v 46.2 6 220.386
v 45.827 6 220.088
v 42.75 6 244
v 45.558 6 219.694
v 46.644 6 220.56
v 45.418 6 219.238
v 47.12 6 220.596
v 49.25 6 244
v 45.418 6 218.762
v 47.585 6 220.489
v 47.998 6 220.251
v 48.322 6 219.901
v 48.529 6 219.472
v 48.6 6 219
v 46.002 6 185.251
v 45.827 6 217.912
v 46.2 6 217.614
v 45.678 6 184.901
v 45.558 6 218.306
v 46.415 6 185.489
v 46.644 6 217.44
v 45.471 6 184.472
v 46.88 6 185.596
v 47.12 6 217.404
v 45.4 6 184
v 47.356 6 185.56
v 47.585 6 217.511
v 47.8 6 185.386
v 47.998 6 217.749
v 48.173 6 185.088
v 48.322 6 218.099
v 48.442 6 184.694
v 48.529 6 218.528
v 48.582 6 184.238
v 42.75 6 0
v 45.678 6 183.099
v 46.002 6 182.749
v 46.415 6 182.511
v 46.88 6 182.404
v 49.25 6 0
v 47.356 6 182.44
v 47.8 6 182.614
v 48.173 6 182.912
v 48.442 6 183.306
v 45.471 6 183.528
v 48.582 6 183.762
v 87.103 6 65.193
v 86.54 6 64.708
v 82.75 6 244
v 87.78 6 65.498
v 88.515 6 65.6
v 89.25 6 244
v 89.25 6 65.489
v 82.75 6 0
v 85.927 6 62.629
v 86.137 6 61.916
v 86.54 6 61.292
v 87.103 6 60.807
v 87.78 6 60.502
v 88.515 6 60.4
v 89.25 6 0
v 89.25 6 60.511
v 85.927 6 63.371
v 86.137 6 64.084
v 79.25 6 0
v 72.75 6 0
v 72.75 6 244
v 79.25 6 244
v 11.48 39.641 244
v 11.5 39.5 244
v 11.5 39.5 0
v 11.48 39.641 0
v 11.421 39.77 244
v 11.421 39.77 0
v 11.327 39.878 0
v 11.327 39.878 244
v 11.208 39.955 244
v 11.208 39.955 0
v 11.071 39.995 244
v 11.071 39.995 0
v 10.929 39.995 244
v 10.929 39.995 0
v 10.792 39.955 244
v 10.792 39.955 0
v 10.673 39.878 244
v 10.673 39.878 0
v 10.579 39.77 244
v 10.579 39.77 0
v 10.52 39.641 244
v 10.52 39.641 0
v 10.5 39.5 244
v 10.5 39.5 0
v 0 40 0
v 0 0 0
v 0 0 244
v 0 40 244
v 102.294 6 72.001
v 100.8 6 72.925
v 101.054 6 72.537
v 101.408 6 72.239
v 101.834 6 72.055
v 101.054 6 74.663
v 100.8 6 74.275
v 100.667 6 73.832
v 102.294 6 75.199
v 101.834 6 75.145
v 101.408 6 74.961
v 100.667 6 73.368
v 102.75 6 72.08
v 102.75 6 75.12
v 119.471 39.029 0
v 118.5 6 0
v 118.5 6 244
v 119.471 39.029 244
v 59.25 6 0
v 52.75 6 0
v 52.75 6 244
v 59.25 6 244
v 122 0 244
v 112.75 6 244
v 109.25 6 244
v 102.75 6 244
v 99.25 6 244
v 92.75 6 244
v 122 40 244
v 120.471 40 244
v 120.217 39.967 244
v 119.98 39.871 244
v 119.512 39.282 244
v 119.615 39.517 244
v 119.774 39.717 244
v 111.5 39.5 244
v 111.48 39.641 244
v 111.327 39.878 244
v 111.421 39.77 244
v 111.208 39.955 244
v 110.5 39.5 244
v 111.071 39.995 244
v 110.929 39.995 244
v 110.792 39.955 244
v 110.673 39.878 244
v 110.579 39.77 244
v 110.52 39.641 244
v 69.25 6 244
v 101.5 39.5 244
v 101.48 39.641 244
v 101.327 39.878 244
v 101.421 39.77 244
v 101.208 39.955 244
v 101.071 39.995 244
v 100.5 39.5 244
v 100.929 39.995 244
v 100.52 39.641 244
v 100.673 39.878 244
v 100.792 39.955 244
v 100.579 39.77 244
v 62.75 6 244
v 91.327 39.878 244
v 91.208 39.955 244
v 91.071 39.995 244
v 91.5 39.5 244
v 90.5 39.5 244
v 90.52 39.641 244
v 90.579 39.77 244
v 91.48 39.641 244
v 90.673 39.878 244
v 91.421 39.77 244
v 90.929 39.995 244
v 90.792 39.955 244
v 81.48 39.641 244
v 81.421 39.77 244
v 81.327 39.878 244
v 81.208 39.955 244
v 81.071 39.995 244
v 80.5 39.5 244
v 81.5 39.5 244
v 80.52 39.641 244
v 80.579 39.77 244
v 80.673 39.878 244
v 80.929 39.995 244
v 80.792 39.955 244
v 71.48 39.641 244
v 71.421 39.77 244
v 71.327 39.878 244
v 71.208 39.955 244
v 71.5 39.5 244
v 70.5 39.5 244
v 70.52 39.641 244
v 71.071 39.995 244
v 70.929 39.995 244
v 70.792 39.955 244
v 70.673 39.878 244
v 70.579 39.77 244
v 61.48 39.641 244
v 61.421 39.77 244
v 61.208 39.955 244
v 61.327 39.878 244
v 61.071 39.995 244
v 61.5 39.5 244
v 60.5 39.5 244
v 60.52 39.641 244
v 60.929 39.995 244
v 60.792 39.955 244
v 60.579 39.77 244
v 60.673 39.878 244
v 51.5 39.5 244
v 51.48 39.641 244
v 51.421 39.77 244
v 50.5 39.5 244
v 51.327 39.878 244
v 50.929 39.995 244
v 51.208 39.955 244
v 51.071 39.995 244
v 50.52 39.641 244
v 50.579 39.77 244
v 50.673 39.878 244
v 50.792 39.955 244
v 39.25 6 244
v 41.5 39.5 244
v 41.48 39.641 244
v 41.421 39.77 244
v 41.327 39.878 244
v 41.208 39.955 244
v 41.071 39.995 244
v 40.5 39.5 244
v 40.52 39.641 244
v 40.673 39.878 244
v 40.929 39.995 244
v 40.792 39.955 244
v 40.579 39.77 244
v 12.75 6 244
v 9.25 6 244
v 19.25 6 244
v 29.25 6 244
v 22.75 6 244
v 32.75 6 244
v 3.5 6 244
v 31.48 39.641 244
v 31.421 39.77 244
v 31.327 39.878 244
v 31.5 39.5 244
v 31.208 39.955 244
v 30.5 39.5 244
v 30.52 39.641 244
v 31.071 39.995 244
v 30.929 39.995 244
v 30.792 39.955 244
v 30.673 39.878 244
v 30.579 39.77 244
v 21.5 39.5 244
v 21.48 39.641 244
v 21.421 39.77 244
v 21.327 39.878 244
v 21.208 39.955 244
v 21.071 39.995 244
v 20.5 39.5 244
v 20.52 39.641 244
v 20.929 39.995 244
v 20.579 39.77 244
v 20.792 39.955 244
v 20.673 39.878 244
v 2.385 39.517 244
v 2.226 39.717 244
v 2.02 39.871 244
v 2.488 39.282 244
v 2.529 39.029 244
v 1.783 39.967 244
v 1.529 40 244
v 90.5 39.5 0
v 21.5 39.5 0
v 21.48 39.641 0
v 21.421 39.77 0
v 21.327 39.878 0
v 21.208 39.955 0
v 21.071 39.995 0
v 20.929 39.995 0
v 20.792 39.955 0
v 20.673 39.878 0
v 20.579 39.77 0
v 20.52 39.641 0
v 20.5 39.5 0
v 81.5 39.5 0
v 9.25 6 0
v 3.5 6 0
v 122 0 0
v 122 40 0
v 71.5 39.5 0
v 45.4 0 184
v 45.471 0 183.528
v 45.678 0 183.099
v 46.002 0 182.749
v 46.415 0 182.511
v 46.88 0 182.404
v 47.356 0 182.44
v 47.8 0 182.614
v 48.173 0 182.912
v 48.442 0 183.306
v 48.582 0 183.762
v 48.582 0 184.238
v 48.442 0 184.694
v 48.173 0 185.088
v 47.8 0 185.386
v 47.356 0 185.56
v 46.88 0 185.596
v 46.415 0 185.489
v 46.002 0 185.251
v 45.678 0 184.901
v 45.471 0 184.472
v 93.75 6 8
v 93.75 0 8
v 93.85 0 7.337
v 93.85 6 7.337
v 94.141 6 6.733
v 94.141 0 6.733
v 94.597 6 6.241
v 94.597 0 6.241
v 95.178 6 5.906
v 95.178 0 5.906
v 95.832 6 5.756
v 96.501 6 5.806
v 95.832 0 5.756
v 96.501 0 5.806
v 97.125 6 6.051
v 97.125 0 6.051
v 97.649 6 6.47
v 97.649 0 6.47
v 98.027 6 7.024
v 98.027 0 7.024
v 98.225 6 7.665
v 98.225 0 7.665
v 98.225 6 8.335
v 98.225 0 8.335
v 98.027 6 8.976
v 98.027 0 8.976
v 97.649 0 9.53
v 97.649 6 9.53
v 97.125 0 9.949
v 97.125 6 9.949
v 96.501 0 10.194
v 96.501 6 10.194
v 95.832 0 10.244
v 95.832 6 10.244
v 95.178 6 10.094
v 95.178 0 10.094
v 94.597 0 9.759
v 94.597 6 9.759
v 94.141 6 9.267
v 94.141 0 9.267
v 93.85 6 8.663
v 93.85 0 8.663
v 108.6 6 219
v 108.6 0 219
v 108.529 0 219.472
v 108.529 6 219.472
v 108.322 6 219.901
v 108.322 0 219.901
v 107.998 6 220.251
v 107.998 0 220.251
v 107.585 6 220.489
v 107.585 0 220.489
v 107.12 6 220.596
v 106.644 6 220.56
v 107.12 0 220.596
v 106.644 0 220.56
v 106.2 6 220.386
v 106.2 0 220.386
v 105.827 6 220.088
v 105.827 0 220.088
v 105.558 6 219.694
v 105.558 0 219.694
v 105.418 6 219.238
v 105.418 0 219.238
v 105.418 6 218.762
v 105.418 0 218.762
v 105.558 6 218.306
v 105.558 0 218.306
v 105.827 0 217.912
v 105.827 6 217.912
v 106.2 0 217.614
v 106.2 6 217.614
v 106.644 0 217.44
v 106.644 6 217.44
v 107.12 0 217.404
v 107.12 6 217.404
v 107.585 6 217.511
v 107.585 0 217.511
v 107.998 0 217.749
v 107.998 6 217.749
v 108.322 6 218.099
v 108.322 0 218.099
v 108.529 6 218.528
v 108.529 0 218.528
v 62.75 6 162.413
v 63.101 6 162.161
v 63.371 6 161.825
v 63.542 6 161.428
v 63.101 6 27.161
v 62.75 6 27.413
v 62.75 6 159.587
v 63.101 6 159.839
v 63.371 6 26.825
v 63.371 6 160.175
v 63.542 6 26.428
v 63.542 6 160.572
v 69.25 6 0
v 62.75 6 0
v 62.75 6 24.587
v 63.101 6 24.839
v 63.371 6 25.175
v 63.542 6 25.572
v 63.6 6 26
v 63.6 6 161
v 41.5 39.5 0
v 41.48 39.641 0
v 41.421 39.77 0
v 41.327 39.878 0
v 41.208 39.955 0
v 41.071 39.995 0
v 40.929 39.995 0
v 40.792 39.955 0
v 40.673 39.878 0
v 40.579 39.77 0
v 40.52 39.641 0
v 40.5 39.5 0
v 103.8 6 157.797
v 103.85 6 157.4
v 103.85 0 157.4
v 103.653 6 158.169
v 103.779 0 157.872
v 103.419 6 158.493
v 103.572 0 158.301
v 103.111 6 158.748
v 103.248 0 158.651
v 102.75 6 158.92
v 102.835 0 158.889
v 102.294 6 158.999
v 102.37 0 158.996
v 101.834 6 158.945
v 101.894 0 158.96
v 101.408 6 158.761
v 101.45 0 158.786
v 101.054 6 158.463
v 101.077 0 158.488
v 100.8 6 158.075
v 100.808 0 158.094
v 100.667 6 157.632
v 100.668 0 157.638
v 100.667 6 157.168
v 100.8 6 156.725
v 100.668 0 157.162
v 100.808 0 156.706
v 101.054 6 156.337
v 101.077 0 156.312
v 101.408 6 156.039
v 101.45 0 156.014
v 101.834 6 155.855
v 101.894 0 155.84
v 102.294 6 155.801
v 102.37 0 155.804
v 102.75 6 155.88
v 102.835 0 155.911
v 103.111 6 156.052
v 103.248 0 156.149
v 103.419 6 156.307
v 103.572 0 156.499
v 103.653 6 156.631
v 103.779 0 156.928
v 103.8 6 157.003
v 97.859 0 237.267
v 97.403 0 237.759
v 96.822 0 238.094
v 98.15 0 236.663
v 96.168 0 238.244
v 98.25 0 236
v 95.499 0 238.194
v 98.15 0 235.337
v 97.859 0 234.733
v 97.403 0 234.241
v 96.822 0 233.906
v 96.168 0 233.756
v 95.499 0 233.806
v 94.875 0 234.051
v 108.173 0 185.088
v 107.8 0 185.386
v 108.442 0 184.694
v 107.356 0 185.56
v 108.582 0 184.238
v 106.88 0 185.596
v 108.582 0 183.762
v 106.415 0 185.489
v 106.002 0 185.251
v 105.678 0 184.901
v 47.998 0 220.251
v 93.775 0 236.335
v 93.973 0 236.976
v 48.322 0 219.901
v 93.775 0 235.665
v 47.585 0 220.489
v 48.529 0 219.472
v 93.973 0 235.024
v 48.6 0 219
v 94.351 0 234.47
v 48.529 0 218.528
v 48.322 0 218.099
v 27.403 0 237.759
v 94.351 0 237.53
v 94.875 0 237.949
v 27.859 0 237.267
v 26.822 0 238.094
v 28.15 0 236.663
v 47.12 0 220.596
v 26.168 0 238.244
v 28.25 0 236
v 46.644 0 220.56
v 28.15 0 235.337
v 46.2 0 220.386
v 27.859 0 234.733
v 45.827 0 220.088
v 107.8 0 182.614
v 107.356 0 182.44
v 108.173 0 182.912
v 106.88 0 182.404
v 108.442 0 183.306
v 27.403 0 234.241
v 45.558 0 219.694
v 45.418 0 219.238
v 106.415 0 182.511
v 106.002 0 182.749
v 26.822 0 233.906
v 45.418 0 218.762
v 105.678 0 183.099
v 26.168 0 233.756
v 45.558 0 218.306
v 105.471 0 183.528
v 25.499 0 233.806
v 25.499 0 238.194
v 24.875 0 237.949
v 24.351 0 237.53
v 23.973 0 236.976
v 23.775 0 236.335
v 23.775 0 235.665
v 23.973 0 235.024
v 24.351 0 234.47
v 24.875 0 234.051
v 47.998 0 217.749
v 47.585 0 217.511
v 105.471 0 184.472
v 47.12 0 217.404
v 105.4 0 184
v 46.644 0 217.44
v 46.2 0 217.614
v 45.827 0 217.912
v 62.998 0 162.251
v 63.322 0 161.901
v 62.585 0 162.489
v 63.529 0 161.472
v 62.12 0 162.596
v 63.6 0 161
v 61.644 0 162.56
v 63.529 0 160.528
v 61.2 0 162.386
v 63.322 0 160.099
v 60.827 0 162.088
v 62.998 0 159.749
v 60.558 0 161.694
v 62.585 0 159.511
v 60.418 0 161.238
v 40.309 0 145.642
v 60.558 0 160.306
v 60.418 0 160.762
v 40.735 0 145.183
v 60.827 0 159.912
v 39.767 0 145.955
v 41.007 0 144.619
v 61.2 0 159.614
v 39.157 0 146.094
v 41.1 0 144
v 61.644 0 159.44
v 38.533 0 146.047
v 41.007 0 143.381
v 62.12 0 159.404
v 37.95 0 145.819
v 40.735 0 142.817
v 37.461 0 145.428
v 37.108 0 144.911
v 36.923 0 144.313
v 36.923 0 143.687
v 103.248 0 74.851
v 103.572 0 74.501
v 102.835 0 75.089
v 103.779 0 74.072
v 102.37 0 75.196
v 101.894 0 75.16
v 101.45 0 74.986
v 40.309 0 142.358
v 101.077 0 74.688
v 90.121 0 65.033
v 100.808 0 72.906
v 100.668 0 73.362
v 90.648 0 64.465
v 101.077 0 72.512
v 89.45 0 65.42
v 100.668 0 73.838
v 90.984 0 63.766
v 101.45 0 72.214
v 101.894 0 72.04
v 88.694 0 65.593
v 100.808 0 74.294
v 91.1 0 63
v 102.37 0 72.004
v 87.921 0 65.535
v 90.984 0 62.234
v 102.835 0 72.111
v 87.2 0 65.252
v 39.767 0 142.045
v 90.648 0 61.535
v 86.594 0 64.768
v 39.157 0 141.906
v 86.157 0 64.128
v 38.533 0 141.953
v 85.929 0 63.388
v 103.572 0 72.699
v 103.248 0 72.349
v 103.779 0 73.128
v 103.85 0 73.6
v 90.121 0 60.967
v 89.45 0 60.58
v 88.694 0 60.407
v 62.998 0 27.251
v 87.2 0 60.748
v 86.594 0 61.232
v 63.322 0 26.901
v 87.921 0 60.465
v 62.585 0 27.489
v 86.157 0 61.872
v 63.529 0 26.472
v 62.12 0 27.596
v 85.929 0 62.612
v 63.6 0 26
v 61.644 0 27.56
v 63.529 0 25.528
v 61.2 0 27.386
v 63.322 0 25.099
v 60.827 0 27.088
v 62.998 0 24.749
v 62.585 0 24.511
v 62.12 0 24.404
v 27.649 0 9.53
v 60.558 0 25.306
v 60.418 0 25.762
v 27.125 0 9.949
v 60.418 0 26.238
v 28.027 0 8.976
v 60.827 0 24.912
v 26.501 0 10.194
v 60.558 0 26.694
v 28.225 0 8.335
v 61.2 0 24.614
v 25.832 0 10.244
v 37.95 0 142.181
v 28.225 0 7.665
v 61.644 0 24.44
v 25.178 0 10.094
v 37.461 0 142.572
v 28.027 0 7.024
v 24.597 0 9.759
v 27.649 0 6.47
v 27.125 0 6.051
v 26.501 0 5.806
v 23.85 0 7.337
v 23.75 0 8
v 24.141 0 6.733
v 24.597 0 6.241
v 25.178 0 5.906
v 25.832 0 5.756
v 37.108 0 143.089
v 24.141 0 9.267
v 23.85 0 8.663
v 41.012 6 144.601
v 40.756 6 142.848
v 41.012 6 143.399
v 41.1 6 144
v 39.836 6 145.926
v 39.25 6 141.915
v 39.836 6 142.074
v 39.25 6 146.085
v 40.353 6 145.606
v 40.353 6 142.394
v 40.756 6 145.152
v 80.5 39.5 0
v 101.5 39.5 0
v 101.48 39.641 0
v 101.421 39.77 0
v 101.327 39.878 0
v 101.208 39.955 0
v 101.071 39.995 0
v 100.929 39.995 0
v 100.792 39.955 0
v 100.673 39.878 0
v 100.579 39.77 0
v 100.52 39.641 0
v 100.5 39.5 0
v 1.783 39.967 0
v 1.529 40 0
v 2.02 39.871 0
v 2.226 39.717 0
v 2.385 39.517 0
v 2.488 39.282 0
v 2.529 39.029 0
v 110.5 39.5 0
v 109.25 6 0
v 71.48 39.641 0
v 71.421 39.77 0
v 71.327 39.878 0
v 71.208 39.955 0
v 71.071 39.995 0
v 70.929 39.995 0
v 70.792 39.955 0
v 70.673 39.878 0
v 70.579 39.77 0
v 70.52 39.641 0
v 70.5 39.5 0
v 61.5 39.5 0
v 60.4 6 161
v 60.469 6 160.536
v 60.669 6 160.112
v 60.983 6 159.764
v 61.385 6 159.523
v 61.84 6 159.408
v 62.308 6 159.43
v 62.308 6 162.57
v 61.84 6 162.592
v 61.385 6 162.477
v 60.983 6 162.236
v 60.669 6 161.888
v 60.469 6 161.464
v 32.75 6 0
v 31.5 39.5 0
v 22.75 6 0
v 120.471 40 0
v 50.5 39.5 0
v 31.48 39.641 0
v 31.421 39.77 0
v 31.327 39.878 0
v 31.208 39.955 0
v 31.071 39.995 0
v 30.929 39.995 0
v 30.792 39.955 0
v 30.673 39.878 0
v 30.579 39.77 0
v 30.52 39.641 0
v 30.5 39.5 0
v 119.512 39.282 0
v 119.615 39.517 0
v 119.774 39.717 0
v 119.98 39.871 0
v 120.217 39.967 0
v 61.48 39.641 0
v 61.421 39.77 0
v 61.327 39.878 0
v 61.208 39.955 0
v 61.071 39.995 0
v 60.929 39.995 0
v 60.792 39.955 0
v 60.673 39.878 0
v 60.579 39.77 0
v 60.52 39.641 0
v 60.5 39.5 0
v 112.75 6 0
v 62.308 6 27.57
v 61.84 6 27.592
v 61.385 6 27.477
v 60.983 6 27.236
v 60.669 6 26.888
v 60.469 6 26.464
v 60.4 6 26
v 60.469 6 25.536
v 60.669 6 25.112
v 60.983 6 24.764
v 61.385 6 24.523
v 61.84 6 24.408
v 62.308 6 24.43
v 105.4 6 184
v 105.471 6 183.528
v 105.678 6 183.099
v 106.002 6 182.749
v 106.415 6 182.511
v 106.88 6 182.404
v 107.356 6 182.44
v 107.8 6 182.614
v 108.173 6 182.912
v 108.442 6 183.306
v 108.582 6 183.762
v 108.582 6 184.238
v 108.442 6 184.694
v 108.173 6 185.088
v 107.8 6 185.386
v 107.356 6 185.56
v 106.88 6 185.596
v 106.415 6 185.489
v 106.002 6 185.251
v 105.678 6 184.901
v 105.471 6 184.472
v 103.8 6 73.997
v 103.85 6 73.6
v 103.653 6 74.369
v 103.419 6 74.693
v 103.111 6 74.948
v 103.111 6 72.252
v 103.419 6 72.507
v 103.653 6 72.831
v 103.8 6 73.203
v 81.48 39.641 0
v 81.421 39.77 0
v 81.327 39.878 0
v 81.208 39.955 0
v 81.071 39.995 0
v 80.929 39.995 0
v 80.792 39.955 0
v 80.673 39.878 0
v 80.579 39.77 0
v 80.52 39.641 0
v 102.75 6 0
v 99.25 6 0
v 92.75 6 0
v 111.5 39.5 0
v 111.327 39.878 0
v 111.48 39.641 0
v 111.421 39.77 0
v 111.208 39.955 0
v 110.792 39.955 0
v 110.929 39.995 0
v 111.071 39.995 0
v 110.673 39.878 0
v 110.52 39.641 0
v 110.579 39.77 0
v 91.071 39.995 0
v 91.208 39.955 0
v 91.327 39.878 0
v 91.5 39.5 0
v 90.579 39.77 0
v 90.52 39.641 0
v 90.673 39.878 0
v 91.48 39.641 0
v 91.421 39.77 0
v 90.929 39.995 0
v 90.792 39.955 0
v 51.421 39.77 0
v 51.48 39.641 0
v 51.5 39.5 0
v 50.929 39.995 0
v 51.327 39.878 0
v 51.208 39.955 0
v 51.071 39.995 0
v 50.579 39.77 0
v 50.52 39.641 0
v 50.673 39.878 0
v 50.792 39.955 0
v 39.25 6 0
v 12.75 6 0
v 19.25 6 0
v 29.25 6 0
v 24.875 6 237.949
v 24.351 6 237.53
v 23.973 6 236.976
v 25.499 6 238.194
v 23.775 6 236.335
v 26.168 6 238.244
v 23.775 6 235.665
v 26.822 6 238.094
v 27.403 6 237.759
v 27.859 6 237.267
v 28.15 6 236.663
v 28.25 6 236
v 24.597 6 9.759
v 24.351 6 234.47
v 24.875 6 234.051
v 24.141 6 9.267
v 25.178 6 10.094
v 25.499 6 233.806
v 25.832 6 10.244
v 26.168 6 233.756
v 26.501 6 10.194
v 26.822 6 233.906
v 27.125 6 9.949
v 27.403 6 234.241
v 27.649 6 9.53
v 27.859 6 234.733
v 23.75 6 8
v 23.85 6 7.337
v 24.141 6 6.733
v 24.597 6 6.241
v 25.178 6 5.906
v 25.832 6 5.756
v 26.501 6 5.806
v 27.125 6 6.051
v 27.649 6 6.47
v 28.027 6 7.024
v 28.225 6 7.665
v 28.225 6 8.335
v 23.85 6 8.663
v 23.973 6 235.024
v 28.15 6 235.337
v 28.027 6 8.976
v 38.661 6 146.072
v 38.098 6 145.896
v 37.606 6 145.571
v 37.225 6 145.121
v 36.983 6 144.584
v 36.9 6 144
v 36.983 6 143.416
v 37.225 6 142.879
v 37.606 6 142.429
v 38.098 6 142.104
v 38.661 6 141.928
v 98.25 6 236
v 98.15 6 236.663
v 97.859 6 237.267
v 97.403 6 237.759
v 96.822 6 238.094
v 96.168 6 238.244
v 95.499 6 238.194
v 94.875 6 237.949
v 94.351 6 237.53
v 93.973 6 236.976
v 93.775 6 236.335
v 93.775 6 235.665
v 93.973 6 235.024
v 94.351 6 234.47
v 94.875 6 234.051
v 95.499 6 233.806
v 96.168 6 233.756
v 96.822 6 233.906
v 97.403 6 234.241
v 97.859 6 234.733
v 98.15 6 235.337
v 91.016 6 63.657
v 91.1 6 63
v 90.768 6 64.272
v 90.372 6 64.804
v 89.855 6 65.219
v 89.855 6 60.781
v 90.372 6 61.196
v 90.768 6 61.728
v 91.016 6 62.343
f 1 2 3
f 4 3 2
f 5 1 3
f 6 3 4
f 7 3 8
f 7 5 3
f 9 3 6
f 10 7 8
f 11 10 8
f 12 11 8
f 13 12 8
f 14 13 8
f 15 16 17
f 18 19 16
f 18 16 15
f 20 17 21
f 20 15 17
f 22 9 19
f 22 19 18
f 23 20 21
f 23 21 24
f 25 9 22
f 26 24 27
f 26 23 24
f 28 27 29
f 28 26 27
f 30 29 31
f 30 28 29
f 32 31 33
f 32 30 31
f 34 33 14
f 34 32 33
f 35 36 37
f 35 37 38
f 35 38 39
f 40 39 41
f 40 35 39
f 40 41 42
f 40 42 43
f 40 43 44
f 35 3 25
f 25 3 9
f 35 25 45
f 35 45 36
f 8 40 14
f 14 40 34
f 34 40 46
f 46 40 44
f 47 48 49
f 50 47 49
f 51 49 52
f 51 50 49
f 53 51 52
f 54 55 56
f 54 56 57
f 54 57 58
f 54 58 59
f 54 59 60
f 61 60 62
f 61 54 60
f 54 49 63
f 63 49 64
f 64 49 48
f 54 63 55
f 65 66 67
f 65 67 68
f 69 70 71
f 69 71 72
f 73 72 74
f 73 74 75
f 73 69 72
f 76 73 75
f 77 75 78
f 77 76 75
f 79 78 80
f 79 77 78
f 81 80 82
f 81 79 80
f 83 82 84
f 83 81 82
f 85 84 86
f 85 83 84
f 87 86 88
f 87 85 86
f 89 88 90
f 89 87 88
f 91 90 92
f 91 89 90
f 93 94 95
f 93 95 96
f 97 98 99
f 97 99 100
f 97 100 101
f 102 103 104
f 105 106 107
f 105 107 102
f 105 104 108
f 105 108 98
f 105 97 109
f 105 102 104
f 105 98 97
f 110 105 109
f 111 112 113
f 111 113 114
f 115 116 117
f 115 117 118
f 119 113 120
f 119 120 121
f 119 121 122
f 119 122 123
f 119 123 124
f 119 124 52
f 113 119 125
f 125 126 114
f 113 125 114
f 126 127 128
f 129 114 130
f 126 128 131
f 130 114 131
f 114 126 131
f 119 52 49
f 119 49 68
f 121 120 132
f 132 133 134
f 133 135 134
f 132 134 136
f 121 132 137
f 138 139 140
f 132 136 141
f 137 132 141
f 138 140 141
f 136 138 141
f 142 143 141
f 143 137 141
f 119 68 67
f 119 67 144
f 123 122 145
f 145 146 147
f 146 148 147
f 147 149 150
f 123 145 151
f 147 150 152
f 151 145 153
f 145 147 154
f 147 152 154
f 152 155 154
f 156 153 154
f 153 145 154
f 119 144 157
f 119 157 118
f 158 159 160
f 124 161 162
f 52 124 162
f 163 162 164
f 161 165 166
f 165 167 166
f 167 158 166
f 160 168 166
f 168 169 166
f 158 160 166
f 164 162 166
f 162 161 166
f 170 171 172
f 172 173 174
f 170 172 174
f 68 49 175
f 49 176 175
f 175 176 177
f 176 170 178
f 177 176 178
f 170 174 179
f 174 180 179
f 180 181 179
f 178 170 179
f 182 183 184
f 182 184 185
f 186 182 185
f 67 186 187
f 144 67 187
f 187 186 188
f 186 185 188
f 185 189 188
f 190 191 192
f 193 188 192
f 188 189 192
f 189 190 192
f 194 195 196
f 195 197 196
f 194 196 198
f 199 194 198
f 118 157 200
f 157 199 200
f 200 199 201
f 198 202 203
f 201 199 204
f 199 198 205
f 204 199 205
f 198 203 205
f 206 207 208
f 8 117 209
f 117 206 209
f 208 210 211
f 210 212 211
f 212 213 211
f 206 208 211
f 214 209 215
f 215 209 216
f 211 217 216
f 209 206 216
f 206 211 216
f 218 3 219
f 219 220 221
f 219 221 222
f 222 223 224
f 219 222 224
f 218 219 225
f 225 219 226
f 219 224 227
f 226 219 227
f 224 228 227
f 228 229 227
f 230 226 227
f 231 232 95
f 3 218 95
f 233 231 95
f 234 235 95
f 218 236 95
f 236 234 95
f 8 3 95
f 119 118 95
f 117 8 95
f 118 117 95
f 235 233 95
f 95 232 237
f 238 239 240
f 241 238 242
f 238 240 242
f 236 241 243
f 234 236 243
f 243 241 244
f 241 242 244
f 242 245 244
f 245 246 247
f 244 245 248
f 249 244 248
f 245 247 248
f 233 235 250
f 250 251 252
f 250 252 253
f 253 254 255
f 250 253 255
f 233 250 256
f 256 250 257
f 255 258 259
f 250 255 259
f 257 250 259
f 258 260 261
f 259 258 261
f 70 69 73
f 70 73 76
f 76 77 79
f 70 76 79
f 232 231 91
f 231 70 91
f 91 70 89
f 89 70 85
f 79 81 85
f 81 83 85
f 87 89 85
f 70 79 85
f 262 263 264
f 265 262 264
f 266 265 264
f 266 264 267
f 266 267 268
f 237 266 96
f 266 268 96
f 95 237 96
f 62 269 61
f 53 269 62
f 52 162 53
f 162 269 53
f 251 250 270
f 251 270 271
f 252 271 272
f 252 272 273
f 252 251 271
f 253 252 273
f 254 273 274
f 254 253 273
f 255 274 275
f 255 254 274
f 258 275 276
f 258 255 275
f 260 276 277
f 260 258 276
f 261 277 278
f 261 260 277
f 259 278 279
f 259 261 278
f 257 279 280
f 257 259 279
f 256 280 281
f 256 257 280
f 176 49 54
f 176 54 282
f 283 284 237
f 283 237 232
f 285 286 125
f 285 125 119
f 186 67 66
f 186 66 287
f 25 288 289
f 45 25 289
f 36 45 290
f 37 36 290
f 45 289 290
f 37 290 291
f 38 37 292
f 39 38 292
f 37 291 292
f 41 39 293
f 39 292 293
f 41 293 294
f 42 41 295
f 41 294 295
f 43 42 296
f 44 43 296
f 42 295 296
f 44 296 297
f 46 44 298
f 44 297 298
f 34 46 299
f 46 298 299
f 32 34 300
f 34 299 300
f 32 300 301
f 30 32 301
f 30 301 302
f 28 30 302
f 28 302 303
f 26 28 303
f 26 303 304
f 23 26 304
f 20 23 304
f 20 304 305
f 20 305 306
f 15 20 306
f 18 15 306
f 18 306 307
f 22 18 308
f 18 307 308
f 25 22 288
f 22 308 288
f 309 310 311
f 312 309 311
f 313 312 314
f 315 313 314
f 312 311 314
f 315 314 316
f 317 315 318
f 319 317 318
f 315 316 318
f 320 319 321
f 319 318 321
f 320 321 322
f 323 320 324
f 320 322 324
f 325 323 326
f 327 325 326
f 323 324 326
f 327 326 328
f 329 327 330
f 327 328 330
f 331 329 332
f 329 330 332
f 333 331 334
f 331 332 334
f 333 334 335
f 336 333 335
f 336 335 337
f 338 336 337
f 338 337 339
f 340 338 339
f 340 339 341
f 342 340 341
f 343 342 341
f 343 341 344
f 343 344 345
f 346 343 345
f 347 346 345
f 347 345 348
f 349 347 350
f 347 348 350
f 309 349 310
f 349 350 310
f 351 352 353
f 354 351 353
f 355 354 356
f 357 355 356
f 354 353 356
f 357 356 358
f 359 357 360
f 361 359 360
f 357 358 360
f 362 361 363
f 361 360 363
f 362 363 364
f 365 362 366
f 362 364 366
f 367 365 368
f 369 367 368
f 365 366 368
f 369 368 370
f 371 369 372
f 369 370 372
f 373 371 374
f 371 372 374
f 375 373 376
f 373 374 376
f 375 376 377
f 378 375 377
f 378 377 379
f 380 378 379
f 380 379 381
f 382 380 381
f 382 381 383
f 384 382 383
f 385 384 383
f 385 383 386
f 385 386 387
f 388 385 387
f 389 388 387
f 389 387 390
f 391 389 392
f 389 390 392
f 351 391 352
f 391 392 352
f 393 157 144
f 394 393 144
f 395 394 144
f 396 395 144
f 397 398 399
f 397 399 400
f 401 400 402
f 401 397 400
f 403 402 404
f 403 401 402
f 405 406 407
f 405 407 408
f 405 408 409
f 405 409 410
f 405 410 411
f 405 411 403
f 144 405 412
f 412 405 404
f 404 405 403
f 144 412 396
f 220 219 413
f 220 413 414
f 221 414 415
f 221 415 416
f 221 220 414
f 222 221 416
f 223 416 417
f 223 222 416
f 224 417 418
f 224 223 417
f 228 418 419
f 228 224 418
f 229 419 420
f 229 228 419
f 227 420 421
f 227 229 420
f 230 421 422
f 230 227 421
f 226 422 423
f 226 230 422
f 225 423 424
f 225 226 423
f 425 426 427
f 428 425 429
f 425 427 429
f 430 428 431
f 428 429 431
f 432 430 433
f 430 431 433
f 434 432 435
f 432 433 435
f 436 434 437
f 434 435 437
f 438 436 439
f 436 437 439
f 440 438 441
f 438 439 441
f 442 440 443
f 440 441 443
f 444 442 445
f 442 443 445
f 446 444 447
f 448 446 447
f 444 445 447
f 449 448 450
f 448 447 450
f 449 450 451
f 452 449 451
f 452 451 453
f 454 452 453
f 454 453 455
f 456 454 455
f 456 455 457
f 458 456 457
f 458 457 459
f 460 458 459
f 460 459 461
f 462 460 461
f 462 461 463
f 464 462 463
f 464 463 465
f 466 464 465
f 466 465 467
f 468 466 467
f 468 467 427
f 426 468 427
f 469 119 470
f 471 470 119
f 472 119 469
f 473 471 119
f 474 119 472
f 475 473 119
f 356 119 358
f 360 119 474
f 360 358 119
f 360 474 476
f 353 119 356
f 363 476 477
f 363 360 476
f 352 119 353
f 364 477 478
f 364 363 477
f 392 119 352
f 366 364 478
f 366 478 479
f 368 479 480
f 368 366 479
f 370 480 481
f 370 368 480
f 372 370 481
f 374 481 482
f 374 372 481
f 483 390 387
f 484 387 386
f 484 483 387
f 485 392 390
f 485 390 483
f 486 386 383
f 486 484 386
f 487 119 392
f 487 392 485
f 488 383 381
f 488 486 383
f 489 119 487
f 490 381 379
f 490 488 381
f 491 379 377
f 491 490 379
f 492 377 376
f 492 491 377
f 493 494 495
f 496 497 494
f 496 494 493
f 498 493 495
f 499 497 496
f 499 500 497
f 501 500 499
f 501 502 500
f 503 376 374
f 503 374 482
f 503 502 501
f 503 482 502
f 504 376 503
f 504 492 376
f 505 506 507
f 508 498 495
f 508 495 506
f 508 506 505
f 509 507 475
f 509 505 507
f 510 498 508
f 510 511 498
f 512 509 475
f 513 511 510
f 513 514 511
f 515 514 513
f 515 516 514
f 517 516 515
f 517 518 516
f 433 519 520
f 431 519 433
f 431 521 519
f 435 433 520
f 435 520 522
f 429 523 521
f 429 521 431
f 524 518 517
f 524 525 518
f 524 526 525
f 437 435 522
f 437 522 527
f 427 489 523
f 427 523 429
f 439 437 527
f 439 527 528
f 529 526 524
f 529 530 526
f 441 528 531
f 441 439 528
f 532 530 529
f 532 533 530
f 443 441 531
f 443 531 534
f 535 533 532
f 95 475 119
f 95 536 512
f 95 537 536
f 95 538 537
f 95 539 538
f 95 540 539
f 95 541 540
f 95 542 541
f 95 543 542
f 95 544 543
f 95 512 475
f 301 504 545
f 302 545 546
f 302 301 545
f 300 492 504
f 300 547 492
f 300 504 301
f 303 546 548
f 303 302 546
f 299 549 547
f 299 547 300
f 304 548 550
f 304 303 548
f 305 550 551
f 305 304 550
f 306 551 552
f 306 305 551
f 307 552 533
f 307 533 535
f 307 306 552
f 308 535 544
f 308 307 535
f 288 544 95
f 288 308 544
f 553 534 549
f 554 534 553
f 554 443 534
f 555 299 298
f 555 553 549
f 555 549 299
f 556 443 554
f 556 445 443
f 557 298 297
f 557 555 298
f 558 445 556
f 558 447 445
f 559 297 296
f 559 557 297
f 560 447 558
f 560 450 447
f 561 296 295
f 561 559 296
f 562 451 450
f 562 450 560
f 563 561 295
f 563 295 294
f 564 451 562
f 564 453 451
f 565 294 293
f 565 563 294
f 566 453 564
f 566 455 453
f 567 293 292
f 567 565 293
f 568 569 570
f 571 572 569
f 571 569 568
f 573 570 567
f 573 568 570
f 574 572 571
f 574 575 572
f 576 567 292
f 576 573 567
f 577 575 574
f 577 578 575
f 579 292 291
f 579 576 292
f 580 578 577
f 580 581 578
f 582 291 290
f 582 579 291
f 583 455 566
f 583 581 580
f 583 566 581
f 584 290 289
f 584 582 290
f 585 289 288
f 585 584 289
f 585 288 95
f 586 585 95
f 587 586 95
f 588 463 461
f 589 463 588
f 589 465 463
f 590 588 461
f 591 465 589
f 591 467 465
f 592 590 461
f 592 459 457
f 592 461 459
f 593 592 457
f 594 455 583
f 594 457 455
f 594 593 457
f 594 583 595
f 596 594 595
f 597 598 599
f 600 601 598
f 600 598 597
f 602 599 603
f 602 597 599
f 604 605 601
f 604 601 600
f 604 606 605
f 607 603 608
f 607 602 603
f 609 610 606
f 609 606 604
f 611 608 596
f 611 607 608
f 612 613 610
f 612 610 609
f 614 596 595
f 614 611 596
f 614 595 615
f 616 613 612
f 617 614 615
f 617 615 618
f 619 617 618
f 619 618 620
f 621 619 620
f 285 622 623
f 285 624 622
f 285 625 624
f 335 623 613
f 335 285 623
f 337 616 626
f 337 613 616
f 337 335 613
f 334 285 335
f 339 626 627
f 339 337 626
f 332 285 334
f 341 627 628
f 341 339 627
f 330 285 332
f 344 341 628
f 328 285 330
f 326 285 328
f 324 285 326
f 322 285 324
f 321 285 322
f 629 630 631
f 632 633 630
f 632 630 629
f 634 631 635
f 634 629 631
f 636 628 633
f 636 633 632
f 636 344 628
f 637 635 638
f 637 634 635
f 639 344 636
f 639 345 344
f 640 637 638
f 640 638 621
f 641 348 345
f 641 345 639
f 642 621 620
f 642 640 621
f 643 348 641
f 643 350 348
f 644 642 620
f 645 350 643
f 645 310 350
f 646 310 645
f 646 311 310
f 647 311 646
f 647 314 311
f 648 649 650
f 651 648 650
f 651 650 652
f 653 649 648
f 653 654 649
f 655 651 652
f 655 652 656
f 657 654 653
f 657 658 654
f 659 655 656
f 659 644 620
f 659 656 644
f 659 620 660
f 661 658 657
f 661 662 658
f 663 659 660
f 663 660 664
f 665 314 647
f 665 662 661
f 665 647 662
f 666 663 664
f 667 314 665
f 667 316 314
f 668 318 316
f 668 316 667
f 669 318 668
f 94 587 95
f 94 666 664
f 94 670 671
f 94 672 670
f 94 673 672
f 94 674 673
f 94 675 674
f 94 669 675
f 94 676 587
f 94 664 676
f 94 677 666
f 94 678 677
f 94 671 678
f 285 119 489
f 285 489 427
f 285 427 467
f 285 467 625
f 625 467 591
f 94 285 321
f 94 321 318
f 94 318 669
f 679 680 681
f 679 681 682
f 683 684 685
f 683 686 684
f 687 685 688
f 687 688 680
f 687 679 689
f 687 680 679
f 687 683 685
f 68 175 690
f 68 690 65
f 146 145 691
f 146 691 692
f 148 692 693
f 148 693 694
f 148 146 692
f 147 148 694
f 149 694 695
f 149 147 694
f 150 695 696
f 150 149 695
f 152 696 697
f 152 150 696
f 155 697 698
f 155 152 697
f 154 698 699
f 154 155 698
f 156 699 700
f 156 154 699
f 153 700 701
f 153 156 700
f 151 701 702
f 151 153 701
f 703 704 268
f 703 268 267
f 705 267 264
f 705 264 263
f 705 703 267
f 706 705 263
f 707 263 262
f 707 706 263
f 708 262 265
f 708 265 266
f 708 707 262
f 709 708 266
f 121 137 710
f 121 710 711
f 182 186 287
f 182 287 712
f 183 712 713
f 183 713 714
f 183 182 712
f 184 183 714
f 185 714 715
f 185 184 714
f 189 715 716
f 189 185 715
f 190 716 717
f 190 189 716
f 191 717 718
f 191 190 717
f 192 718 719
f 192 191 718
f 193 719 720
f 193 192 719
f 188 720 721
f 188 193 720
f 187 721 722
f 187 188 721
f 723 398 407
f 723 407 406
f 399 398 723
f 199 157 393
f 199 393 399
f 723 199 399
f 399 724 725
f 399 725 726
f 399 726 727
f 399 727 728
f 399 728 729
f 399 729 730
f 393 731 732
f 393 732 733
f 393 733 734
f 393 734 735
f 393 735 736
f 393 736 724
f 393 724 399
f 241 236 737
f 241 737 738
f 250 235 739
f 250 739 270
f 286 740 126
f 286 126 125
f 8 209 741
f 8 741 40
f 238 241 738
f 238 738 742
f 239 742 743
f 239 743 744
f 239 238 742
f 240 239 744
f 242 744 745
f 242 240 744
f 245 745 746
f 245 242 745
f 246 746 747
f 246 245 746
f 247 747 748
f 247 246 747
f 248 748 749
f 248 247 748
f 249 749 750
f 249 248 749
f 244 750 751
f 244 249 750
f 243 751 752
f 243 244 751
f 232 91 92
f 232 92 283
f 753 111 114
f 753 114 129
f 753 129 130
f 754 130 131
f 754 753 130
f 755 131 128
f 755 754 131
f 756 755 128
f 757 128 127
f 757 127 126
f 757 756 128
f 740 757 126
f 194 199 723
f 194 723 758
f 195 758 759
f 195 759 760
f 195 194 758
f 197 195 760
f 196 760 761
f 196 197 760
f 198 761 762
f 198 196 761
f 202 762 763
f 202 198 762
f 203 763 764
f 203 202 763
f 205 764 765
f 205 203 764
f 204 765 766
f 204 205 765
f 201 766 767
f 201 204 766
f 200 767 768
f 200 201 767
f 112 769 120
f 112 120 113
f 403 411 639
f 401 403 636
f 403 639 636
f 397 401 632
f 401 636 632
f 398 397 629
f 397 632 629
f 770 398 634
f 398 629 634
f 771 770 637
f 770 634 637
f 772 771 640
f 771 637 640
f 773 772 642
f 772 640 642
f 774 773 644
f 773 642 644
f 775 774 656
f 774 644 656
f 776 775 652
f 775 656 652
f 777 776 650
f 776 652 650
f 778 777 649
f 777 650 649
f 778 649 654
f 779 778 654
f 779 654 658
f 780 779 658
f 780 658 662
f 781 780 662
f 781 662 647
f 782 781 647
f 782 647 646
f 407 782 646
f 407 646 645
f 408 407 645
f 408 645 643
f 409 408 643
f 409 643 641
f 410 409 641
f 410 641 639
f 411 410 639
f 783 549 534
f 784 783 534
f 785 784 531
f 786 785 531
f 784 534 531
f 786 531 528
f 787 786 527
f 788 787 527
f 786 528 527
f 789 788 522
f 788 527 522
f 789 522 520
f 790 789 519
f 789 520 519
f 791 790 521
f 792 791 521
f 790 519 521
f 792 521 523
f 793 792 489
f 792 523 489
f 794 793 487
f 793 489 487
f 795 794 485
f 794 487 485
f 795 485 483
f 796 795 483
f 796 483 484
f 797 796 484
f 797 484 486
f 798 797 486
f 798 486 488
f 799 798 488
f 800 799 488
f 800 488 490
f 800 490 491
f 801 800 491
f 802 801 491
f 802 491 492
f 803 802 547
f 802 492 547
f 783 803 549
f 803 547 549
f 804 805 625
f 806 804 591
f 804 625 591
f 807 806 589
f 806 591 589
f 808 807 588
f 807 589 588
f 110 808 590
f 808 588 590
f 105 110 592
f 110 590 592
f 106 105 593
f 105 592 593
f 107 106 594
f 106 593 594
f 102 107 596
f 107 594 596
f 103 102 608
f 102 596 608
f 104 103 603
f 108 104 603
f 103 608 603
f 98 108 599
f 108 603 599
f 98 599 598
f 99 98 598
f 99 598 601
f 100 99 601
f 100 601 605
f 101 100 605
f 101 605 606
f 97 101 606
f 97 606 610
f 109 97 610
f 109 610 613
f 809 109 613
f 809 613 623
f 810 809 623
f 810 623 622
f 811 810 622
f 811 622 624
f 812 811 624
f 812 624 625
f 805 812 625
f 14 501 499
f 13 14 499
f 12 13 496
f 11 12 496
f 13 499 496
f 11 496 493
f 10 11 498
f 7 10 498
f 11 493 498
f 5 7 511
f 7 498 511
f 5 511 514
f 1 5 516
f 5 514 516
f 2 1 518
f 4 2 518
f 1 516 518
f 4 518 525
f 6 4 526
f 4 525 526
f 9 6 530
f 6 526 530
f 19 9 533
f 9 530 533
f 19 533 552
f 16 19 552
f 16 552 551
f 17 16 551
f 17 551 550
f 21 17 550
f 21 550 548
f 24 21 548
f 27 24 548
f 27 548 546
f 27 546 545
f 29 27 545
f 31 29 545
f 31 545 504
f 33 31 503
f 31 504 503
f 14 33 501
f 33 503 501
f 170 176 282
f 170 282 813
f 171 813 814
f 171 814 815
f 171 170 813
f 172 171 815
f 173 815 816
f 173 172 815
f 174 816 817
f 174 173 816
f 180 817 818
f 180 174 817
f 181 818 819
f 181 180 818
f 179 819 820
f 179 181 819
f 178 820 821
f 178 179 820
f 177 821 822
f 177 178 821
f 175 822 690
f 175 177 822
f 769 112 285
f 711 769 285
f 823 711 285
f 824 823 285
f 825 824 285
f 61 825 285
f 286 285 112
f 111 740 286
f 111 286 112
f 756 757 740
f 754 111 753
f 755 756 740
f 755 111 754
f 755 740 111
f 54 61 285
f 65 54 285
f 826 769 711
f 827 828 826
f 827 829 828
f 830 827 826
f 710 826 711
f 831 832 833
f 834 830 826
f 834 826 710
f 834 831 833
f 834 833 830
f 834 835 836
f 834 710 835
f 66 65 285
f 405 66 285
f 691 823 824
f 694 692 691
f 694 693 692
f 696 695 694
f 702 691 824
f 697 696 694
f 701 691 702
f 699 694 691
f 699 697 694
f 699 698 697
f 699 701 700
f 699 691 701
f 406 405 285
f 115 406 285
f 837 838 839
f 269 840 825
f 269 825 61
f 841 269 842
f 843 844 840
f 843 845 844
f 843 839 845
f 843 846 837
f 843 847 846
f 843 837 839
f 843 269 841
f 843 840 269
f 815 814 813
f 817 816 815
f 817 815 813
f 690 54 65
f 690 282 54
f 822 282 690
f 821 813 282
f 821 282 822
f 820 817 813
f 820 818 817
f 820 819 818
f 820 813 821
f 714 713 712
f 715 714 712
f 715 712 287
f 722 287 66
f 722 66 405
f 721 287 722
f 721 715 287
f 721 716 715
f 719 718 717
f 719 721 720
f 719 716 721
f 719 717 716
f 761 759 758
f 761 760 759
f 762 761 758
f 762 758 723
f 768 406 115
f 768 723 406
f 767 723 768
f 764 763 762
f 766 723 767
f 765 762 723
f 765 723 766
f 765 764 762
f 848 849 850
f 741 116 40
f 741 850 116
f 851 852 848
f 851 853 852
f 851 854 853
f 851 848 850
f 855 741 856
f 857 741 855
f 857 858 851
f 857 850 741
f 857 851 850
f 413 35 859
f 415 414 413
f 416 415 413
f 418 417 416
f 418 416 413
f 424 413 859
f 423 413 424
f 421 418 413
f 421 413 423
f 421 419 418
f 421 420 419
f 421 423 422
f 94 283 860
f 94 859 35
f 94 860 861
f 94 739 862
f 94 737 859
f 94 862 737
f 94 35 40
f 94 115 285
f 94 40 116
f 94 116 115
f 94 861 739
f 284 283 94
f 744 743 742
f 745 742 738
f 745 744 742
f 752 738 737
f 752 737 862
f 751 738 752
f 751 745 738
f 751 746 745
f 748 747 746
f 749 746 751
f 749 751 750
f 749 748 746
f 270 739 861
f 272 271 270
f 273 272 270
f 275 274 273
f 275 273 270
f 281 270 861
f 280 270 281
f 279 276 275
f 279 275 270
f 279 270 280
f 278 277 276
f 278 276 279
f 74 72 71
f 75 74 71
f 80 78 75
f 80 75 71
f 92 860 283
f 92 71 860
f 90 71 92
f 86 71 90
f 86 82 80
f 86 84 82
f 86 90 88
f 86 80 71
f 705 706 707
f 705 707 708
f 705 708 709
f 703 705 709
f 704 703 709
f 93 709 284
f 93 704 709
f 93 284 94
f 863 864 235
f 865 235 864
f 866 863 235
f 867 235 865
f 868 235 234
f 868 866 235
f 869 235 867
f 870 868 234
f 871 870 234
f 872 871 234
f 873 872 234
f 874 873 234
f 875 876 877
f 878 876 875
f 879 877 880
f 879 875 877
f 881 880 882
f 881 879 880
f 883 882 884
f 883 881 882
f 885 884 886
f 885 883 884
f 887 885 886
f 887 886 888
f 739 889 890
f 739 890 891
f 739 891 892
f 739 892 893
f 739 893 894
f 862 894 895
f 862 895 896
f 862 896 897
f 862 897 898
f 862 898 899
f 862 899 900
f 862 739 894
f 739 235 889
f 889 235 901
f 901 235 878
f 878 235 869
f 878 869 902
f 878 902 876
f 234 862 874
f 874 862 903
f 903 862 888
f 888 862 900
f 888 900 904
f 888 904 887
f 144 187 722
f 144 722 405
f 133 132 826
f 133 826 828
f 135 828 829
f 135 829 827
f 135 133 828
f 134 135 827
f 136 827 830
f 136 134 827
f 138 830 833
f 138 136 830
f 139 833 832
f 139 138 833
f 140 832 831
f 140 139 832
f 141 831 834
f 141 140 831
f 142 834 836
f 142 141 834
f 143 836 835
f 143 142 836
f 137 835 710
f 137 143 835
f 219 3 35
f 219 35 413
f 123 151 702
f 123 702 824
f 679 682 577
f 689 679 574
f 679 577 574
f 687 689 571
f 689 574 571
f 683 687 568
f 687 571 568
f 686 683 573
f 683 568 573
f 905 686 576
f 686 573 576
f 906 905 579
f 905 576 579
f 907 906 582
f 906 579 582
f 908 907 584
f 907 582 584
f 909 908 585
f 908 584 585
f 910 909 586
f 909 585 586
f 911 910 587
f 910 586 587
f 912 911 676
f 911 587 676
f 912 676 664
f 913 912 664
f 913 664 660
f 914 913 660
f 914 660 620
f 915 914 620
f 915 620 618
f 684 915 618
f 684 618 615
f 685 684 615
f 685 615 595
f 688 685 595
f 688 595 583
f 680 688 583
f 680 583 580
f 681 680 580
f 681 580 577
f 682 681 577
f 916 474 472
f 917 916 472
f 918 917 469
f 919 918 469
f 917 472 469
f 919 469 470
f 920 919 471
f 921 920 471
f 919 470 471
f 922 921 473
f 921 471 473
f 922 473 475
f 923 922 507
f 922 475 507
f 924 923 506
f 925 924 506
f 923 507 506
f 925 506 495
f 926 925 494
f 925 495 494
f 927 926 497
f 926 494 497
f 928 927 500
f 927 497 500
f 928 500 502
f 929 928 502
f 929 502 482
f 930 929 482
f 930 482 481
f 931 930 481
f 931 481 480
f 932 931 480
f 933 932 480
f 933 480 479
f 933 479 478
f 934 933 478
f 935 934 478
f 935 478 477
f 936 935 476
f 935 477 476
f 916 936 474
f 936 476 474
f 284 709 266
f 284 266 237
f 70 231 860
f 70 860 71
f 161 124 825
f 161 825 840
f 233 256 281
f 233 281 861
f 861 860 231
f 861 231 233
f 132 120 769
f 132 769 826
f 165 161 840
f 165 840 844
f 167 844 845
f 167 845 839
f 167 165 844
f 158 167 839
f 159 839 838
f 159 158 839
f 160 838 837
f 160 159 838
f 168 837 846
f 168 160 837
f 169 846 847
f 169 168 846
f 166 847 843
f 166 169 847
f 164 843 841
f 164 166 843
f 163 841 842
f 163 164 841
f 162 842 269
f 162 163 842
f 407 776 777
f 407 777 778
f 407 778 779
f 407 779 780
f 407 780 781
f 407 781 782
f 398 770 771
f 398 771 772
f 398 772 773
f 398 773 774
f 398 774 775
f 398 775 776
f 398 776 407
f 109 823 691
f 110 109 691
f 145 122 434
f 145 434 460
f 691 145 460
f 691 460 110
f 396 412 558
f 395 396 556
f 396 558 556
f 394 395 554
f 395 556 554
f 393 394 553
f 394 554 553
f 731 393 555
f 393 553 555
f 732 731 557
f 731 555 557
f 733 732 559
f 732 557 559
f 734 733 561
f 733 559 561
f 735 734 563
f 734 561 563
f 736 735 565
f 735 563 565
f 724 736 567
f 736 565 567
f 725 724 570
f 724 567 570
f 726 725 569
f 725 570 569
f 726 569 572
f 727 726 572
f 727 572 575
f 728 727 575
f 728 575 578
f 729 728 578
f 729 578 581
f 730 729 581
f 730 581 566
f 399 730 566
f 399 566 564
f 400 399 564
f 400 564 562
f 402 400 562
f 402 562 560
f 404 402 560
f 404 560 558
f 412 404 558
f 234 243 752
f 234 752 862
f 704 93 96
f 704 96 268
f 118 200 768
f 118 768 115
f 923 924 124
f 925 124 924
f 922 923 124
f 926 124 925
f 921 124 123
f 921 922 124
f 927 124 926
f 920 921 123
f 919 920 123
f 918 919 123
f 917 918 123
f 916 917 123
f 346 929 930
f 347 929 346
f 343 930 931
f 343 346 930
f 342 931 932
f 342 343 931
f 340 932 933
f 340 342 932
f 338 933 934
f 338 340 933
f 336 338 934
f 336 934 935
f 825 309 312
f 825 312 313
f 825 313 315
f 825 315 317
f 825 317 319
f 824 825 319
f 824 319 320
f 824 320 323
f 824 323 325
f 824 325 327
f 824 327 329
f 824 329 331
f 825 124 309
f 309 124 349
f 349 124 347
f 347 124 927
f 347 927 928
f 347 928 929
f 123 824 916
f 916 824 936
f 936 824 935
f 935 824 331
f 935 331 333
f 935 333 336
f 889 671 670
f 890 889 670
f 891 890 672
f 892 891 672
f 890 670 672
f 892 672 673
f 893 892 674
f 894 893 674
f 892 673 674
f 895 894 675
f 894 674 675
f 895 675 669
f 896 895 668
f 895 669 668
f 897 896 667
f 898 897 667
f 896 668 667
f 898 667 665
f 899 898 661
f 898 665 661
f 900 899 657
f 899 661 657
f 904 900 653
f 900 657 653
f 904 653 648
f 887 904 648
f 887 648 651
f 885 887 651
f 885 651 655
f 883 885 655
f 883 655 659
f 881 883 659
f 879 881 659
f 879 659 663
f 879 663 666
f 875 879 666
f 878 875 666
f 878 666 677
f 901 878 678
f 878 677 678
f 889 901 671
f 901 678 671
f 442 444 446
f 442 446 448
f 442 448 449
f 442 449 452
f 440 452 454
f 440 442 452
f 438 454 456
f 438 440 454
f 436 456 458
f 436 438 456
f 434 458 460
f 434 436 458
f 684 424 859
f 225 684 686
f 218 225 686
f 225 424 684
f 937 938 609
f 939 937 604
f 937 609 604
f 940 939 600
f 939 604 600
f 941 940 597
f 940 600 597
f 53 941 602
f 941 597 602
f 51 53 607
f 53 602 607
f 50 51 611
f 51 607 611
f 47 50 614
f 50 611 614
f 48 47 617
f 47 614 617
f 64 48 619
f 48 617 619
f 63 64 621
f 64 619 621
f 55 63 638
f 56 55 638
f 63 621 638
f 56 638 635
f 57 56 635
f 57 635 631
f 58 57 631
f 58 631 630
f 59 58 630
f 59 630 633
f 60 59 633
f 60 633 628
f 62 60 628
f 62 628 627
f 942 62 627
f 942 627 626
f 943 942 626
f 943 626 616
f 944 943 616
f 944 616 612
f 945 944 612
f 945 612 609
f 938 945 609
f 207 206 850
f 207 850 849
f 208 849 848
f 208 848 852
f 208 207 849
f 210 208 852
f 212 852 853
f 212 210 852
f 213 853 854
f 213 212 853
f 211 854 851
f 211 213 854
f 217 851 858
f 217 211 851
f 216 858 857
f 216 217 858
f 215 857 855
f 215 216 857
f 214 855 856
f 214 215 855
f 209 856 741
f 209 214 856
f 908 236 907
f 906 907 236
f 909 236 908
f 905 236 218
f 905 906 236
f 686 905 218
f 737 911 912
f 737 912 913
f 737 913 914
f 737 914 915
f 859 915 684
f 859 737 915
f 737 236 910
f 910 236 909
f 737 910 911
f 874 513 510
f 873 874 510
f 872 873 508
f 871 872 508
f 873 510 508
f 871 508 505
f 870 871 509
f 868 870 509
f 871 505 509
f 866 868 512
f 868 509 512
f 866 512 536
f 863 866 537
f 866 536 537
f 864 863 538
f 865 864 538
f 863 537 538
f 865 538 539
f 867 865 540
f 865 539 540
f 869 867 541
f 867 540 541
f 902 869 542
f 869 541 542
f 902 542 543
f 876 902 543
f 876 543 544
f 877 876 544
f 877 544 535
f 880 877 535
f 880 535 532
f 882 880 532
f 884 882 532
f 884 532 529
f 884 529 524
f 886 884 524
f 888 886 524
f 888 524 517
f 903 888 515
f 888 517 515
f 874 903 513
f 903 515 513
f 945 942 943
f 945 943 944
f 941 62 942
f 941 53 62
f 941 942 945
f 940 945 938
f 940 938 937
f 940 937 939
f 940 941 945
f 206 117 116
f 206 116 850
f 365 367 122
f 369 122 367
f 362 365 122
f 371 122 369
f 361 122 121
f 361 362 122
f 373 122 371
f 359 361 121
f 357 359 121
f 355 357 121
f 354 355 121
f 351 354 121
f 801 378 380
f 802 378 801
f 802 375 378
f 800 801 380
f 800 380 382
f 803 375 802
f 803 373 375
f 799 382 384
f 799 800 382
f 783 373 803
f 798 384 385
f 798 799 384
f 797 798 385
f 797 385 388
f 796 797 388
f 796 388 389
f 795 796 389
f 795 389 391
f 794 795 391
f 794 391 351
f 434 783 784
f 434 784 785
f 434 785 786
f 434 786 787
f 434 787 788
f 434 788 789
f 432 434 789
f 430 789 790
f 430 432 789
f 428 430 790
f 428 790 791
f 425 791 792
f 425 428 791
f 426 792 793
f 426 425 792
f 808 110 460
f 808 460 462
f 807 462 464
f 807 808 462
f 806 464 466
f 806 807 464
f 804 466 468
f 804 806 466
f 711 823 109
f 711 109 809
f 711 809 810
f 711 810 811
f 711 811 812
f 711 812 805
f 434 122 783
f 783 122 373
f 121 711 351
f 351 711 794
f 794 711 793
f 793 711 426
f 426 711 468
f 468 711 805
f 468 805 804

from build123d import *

# Parameters (mm, degrees)
EXTRUDE_1_DEPTH       = 244
EXTRUDE_3_DEPTH       = 244
PATTERN_CURVE_1_COUNT = 11
PATTERN_CURVE_1_PITCH = 10
SKETCH_3_R            = 2.25
CUT_EXTRUDE_1_DEPTH   = 6
SKETCH_4_R            = 2.6
SKETCH_4_R_2          = 1.6
CUT_EXTRUDE_2_DEPTH   = 6
SKETCH_5_R            = 2.1
SKETCH_5_R_2          = 1.6
CUT_EXTRUDE_3_DEPTH   = 6


with BuildPart() as part:
    # Эскиз1 → Вытянуть1 (new body)
    with BuildSketch(Plane.XY):
        with BuildLine():
            Line((0, 40), (1.528979332, 40))
            ThreePointArc((1.528979332, 40), (2.225614441, 39.717425624), (2.528547087, 39.029399052))
            Line((2.528547087, 39.029399052), (3.5, 6))
            Line((3.5, 6), (118.5, 6))
            Line((118.5, 6), (119.471452913, 39.029399052))
            ThreePointArc((119.471452913, 39.029399052), (119.774385559, 39.717425624), (120.471020668, 40))
            Line((120.471020668, 40), (122, 40))
            Line((122, 40), (122, 0))
            Line((122, 0), (0, 0))
            Line((0, 0), (0, 40))
        make_face()
    extrude(amount=EXTRUDE_1_DEPTH)

    # Эскиз2 → Вытянуть3 (add)
    with BuildSketch(Plane.XY.offset(244)):
        with BuildLine():
            Line((10.5, 39.5), (9.25, 6))
            Line((9.25, 6), (12.75, 6))
            Line((12.75, 6), (11.5, 39.5))
            ThreePointArc((11.5, 39.5), (11, 40), (10.5, 39.5))
        make_face()
    extrude_3 = extrude(amount=-EXTRUDE_3_DEPTH)

    # Кривая1: Вытянуть3 ×11
    with Locations(*[(i * PATTERN_CURVE_1_PITCH, 0, 0) for i in range(1, PATTERN_CURVE_1_COUNT)]):
        add(extrude_3)

    # Эскиз3 → Вырез-Вытянуть1 (cut)
    with BuildSketch(Plane.XZ):
        with Locations((26, 236)):
            Circle(SKETCH_3_R)
        with Locations((96, 236)):
            Circle(SKETCH_3_R)
        with Locations(Location((96, 8, 0), (0, 0, 180))):
            Circle(SKETCH_3_R)
        with Locations(Location((26, 8, 0), (0, 0, 180))):
            Circle(SKETCH_3_R)
    extrude(amount=-CUT_EXTRUDE_1_DEPTH, mode=Mode.SUBTRACT)

    # Эскиз4 → Вырез-Вытянуть2 (cut)
    with BuildSketch(Plane(origin=(-5.723570629, 0, -26.359021189), x_dir=(1, 0, 0), z_dir=(0, -1, 0))):
        with Locations((94.223570629, 89.359021189)):
            Circle(SKETCH_4_R)
        with Locations((67.723570629, 187.359021189)):
            Circle(SKETCH_4_R_2)
        with Locations((67.723570629, 52.359021189)):
            Circle(SKETCH_4_R_2)
        with Locations((107.973570629, 183.759021189)):
            Circle(SKETCH_4_R_2)
        with Locations((107.973570629, 99.959021189)):
            Circle(SKETCH_4_R_2)
    extrude(amount=-CUT_EXTRUDE_2_DEPTH, mode=Mode.SUBTRACT)

    # Эскиз5 → Вырез-Вытянуть3 (cut)
    with BuildSketch(Plane(origin=(128.324191418, 0, 423.775874855), x_dir=(-1, 0, 0), z_dir=(0, -1, 0))):
        with Locations(Location((89.324191418, 279.775874855, 0), (0, 0, 180))):
            Circle(SKETCH_5_R)
        with Locations((21.324191418, 239.775874855)):
            Circle(SKETCH_5_R_2)
        with Locations((81.324191418, 239.775874855)):
            Circle(SKETCH_5_R_2)
        with Locations(Location((81.324191418, 204.775874855, 0), (0, 0, 180))):
            Circle(SKETCH_5_R_2)
        with Locations(Location((21.324191418, 204.775874855, 0), (0, 0, 180))):
            Circle(SKETCH_5_R_2)
    extrude(amount=-CUT_EXTRUDE_3_DEPTH, mode=Mode.SUBTRACT)


solid = part.part
